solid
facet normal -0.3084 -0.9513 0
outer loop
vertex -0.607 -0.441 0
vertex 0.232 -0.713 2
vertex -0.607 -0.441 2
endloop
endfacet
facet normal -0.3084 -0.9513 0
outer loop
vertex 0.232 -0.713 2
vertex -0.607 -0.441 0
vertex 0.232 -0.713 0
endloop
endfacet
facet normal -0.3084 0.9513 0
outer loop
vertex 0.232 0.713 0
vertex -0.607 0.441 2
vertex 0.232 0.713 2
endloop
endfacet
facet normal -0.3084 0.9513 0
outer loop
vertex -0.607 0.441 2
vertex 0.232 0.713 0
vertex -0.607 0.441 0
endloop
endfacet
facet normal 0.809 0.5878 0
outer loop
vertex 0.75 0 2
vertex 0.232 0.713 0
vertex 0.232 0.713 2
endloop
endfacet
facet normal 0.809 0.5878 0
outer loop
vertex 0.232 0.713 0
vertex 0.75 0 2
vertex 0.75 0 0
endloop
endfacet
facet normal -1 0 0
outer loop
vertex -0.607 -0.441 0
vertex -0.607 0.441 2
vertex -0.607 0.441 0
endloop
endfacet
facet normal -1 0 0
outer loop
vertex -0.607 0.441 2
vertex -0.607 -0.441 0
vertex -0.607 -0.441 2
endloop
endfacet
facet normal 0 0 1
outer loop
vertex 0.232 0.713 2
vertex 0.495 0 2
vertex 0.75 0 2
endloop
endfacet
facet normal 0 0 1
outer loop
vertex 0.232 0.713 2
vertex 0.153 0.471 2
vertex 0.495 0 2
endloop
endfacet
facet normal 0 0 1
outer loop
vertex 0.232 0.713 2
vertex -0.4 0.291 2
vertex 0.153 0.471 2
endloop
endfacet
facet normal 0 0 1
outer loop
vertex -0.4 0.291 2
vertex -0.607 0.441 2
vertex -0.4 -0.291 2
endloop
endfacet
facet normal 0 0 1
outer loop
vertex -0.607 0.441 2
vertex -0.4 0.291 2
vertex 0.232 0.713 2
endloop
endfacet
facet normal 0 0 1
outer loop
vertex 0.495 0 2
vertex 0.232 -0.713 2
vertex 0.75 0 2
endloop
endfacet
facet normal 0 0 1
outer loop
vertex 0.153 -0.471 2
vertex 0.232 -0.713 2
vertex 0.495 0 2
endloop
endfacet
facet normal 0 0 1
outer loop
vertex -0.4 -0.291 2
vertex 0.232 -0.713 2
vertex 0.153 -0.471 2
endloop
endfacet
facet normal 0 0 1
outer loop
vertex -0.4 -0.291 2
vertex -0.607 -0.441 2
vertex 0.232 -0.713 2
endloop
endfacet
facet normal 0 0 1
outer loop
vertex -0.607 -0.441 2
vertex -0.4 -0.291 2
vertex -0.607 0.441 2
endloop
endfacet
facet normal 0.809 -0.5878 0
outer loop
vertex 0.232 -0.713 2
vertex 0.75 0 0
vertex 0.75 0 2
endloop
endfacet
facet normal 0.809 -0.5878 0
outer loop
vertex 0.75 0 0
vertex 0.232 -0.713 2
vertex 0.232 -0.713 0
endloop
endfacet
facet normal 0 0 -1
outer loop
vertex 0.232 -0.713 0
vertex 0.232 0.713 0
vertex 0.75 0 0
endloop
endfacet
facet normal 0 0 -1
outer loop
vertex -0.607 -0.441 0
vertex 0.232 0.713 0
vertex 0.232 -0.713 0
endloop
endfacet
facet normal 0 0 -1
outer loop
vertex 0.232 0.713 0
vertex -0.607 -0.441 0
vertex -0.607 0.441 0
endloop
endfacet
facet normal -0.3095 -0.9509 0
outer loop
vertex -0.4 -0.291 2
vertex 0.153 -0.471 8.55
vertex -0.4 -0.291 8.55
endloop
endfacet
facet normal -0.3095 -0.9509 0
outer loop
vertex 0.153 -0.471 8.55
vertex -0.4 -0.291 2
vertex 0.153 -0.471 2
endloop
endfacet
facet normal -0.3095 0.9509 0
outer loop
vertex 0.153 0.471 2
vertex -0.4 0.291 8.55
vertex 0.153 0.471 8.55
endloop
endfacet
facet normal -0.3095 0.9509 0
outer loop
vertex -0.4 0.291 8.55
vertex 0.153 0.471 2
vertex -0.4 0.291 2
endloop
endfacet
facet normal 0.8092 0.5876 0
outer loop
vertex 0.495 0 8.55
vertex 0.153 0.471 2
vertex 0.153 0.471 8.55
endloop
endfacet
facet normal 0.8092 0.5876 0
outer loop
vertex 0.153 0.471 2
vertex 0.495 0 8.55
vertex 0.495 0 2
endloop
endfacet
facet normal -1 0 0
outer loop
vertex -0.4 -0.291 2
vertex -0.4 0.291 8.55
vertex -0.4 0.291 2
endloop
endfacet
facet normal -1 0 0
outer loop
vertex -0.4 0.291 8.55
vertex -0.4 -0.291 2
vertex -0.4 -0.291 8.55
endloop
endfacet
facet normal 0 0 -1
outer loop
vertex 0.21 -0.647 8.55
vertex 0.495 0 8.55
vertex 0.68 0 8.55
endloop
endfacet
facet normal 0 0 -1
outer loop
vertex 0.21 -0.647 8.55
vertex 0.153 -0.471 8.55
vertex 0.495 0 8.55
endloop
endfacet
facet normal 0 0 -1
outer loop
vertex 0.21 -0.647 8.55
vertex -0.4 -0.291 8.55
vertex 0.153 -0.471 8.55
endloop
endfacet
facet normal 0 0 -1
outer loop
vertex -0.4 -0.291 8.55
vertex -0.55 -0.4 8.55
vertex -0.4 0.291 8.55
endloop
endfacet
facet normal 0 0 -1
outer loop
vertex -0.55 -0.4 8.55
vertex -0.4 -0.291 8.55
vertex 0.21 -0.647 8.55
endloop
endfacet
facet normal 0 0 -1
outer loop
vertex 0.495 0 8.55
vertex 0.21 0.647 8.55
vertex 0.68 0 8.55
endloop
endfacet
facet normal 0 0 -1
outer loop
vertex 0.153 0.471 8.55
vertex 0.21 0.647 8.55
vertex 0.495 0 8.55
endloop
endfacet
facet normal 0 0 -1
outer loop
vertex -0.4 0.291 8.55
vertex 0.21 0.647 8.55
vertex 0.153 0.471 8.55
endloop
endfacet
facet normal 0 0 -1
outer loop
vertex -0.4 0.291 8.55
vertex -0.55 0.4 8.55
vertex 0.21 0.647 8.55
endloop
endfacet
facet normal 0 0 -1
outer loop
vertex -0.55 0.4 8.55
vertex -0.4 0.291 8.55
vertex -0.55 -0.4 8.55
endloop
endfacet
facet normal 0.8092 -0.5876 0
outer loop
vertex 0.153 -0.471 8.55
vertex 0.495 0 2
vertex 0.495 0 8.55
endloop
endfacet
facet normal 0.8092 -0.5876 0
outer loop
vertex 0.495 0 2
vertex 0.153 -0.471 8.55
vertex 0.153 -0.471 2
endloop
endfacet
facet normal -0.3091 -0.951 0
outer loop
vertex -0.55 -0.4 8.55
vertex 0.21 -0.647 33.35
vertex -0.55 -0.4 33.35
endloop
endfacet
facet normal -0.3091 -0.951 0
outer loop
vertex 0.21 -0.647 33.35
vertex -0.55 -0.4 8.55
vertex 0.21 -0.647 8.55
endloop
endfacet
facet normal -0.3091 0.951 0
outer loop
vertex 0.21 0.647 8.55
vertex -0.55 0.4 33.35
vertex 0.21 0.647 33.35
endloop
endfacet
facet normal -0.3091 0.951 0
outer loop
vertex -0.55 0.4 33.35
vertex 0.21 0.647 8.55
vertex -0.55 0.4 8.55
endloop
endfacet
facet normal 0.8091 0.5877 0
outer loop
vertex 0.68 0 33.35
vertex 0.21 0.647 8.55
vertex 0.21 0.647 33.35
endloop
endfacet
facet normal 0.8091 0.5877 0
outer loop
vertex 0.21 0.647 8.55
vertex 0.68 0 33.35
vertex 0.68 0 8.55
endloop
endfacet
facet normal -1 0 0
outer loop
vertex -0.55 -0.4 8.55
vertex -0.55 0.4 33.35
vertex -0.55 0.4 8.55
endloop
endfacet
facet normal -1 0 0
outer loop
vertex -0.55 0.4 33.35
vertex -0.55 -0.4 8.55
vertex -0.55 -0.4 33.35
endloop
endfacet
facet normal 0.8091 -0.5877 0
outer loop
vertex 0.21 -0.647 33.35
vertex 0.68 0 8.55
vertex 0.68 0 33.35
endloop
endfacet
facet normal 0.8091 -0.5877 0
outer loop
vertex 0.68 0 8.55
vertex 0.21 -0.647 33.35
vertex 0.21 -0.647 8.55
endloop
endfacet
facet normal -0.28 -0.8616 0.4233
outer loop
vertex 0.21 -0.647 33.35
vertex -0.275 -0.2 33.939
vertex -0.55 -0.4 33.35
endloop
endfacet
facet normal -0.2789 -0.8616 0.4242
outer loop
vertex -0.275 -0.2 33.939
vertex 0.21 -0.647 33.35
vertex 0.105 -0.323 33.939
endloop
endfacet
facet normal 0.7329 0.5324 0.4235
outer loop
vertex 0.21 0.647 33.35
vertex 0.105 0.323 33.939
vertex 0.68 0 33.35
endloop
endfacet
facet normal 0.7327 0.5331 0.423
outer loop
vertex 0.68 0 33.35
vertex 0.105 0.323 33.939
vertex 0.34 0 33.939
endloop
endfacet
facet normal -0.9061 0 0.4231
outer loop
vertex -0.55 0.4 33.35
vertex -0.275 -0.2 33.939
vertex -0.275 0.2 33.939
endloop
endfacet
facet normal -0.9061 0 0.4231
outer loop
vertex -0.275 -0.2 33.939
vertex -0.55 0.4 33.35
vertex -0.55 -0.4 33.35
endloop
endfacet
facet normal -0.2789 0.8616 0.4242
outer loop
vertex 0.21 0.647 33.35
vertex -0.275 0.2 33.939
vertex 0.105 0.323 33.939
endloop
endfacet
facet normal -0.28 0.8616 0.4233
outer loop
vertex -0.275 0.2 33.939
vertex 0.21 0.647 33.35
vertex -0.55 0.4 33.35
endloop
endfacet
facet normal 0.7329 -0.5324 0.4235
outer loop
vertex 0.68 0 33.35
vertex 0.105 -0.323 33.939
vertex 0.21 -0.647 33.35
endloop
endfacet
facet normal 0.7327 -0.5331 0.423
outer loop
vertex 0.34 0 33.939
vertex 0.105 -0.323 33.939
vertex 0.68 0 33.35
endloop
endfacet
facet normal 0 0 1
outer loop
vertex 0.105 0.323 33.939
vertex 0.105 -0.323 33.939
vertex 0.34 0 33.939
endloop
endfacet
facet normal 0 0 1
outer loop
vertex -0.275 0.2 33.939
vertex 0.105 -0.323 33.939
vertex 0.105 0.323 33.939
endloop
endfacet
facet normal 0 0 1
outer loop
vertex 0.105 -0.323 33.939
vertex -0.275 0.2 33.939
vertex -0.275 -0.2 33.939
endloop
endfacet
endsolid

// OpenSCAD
module P100() {
   /* Flat Top */
    head_diameter = 1.5;
    head_height = 2;
    top_shaft_diameter = 0.99;
    body_shaft_diameter = 1.36;
    body_shaft_length = 24.8;
    total_length = 33.35;
    top_shaft_length = total_length-body_shaft_length-head_height;
    
    color("Silver")
    translate([0,0,head_height/2])cylinder(d=head_diameter, h=head_height, center=true);
    
    color("Silver")
    translate([0,0,head_height])cylinder(d=top_shaft_diameter, h=top_shaft_length);
    
    color("Gold")
    translate([0,0,head_height+top_shaft_length])cylinder(h=body_shaft_length, d=body_shaft_diameter);
    
    color("Gold")
    translate([0,0,head_height+top_shaft_length+body_shaft_length])sphere(d=body_shaft_diameter);
}

P100();
